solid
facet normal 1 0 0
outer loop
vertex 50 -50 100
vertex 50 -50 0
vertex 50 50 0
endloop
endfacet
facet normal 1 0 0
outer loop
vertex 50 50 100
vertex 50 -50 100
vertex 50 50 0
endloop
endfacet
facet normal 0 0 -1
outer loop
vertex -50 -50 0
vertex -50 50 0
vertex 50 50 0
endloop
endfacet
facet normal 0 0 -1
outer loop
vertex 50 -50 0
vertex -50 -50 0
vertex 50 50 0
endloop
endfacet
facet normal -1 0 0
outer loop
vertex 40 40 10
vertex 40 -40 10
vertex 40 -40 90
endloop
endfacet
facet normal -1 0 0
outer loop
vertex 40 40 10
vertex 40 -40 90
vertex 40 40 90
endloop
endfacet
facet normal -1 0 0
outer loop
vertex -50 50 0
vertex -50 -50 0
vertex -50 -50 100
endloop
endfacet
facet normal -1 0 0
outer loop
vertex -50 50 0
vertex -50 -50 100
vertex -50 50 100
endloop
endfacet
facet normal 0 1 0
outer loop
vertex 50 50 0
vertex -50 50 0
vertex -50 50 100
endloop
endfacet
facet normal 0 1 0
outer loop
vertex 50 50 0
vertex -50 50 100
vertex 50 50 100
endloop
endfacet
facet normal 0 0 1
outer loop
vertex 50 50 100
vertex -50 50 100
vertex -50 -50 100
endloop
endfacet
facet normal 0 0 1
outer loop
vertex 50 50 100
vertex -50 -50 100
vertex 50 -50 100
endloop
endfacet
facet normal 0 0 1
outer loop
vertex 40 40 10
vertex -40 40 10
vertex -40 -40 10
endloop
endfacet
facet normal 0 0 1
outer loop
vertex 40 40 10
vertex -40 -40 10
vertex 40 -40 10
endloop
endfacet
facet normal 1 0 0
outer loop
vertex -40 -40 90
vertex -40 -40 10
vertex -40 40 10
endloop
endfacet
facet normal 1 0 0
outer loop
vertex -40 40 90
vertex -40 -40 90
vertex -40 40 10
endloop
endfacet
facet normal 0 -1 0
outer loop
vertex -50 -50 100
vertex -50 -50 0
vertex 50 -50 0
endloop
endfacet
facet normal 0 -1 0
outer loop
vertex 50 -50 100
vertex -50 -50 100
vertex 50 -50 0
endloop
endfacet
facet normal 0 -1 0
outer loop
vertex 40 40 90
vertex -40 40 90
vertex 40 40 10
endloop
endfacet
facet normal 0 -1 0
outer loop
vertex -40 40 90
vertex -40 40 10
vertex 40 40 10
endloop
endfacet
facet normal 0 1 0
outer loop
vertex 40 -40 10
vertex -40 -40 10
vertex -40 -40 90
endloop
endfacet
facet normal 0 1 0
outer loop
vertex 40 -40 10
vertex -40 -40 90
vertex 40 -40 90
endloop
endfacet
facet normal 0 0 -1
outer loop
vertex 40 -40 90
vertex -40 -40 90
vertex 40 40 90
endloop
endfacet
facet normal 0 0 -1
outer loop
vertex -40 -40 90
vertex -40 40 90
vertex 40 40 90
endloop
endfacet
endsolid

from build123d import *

# Parameters (mm, degrees)
SZKIC1_W                    = 100
SZKIC1_H                    = 100
DODANIE_WYCI_GNI_CIE1_DEPTH = 100
SKORUPA2_T                  = 10


with BuildPart() as part:
    # Szkic1 → Dodanie-wyciągnięcie1 (new body)
    with BuildSketch(Plane.XY):
        Rectangle(SZKIC1_W, SZKIC1_H)
    extrude(amount=DODANIE_WYCI_GNI_CIE1_DEPTH)

    # Skorupa2 (no face opened: a closed hollow body)
    add(offset(amount=-SKORUPA2_T, mode=Mode.PRIVATE), mode=Mode.SUBTRACT)


solid = part.part
